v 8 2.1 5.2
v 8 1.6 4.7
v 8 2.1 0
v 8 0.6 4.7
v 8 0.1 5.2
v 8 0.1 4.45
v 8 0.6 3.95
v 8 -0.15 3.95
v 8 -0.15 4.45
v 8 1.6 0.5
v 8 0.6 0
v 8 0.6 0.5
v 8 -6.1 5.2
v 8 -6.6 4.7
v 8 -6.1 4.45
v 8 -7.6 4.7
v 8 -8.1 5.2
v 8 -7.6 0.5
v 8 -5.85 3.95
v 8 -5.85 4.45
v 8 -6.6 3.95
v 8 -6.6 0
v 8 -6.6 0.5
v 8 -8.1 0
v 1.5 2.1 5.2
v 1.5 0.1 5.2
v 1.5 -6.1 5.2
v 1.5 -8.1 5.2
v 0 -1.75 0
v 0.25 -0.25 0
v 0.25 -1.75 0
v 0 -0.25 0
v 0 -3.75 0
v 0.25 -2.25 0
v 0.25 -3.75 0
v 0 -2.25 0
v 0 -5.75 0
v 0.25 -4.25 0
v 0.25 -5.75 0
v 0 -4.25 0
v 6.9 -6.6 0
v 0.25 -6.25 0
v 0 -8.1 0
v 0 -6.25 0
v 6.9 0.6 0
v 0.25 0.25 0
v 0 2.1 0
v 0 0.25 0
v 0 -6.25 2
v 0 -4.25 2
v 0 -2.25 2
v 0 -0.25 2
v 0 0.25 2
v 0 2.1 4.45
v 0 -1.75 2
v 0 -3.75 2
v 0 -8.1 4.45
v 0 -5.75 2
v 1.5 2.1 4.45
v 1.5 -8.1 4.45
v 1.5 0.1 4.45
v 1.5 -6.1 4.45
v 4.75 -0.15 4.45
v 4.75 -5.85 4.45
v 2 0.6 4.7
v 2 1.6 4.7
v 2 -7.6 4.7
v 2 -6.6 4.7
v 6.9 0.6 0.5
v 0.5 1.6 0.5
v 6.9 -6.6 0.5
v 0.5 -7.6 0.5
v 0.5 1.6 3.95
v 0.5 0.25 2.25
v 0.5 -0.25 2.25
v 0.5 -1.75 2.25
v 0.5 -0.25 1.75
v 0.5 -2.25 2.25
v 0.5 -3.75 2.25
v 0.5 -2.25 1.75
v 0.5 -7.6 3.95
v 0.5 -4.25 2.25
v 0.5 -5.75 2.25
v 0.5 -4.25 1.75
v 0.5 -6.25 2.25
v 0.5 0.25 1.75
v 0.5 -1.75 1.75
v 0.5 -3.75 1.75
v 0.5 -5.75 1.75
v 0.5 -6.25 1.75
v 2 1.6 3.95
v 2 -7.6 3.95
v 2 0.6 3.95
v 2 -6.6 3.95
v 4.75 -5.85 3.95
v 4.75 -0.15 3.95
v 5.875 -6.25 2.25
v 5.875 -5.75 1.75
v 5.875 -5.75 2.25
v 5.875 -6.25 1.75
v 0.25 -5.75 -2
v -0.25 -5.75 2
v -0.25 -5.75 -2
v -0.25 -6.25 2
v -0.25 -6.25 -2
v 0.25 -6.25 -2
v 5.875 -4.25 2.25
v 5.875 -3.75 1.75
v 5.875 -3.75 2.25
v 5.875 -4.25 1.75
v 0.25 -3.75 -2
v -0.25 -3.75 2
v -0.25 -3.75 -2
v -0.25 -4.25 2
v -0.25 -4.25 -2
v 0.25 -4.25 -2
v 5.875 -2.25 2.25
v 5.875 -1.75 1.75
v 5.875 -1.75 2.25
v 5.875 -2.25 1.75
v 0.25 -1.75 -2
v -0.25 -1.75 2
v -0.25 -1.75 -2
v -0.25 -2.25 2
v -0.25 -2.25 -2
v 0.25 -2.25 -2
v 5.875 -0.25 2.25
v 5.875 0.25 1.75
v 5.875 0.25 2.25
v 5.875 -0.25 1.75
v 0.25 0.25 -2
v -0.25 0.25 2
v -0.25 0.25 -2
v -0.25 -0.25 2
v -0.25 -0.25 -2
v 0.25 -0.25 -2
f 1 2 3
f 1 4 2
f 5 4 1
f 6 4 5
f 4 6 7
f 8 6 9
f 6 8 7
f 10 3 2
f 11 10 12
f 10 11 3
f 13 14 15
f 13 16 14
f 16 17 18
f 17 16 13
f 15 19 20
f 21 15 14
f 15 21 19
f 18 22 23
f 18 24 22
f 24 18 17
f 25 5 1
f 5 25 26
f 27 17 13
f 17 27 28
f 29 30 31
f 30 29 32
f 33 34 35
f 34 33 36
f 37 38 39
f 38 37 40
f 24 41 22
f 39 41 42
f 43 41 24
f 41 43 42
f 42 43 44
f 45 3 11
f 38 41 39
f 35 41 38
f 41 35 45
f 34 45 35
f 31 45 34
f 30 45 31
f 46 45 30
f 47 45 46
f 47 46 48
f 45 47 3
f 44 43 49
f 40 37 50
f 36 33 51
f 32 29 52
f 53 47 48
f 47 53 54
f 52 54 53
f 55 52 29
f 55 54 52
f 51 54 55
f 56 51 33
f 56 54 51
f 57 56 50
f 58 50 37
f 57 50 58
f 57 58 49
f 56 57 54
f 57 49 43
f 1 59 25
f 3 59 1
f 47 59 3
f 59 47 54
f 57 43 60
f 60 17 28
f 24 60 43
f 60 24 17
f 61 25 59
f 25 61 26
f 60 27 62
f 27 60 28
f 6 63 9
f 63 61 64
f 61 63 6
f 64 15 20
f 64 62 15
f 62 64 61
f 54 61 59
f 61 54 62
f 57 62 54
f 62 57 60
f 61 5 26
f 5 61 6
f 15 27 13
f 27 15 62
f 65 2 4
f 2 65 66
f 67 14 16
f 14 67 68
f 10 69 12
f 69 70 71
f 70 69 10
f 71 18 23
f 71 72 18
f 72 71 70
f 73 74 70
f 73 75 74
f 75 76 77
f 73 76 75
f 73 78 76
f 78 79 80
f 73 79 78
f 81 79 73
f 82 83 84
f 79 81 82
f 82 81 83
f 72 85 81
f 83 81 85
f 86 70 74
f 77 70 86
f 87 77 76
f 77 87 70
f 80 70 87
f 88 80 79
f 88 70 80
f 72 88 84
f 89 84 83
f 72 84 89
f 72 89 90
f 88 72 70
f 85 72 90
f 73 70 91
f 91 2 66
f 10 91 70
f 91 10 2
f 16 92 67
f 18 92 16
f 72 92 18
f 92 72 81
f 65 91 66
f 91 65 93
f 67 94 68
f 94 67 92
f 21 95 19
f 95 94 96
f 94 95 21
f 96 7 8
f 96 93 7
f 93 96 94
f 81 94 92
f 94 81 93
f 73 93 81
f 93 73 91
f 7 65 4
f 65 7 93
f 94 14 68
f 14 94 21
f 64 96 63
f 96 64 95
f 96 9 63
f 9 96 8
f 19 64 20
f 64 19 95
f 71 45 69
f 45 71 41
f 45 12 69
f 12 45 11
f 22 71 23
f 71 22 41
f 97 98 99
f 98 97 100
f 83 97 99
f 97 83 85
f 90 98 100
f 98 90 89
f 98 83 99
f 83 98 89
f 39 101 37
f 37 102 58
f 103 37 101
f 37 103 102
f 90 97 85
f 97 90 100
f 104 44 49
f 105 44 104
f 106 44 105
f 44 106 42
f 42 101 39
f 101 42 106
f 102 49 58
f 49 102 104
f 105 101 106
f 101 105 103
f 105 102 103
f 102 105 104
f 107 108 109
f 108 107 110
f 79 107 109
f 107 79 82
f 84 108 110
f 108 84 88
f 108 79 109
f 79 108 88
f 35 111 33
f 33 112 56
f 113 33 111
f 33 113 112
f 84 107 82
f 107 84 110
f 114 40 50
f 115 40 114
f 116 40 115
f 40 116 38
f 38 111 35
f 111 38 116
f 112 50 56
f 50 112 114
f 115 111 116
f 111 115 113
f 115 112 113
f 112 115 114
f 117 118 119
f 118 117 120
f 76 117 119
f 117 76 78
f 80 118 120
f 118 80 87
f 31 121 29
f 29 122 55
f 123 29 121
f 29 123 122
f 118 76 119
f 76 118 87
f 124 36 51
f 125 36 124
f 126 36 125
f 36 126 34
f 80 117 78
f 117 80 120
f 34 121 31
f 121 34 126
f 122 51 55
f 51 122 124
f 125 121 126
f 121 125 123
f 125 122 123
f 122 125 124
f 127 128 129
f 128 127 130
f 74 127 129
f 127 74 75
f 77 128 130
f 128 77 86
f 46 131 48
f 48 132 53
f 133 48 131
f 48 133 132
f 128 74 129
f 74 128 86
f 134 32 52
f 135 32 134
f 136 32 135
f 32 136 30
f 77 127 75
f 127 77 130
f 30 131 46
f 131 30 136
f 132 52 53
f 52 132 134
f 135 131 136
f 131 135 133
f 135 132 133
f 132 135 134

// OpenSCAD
// Groove connector L90

//target_obj = "silver_only";

translate([0, -(10.2/2-1.5*2+3*2), 0]) {

    if (is_undef(target_obj) || (target_obj == "white_only"))
    color("White")
    difference() {
        difference() {
            cube([8, 10.2, 5.2]);
            
            translate([1.5-100, -50, 5.2-0.75])
            cube([100, 100, 100]);
            
            translate([-50, 2, 5.2-0.75])
            cube([100, 10.2 - 2*2, 100]);
        };

        translate([0.5, 0.5, 0.5])
        difference() {
            cube([50, 10.2-1, 5.2-1]);
            
            translate([1.5-100, -50, 5.2-0.75-1])
            cube([100, 100, 100]);
            
            translate([-50, 2-1, 5.2-0.75-1])
            cube([100, 10.2 - 2*2 + 1, 100]);
        };
        
        translate([4.75, 2.25, 1])
        cube([50, 10.2 - 2.25*2, 50]);
        
        translate([8.0-1.1, 1.5, -50+1])
        cube([50, 10.2 - 1.5*2, 50]);
    };

    if (is_undef(target_obj) || (target_obj == "silver_only"))
    color("Silver")
    translate([0, 0, 0, 0]) {
        for (a = [0:3]) {
            translate([(8-2)/2, 10.2/2-1.5*2+2*a, 2])
            cube([8-2-0.25, 0.5, 0.5], center = true);
            
            translate([0, 10.2/2-1.5*2+2*a, 0])
            cube([0.5, 0.5, 4], center = true);
        }
    }
}
